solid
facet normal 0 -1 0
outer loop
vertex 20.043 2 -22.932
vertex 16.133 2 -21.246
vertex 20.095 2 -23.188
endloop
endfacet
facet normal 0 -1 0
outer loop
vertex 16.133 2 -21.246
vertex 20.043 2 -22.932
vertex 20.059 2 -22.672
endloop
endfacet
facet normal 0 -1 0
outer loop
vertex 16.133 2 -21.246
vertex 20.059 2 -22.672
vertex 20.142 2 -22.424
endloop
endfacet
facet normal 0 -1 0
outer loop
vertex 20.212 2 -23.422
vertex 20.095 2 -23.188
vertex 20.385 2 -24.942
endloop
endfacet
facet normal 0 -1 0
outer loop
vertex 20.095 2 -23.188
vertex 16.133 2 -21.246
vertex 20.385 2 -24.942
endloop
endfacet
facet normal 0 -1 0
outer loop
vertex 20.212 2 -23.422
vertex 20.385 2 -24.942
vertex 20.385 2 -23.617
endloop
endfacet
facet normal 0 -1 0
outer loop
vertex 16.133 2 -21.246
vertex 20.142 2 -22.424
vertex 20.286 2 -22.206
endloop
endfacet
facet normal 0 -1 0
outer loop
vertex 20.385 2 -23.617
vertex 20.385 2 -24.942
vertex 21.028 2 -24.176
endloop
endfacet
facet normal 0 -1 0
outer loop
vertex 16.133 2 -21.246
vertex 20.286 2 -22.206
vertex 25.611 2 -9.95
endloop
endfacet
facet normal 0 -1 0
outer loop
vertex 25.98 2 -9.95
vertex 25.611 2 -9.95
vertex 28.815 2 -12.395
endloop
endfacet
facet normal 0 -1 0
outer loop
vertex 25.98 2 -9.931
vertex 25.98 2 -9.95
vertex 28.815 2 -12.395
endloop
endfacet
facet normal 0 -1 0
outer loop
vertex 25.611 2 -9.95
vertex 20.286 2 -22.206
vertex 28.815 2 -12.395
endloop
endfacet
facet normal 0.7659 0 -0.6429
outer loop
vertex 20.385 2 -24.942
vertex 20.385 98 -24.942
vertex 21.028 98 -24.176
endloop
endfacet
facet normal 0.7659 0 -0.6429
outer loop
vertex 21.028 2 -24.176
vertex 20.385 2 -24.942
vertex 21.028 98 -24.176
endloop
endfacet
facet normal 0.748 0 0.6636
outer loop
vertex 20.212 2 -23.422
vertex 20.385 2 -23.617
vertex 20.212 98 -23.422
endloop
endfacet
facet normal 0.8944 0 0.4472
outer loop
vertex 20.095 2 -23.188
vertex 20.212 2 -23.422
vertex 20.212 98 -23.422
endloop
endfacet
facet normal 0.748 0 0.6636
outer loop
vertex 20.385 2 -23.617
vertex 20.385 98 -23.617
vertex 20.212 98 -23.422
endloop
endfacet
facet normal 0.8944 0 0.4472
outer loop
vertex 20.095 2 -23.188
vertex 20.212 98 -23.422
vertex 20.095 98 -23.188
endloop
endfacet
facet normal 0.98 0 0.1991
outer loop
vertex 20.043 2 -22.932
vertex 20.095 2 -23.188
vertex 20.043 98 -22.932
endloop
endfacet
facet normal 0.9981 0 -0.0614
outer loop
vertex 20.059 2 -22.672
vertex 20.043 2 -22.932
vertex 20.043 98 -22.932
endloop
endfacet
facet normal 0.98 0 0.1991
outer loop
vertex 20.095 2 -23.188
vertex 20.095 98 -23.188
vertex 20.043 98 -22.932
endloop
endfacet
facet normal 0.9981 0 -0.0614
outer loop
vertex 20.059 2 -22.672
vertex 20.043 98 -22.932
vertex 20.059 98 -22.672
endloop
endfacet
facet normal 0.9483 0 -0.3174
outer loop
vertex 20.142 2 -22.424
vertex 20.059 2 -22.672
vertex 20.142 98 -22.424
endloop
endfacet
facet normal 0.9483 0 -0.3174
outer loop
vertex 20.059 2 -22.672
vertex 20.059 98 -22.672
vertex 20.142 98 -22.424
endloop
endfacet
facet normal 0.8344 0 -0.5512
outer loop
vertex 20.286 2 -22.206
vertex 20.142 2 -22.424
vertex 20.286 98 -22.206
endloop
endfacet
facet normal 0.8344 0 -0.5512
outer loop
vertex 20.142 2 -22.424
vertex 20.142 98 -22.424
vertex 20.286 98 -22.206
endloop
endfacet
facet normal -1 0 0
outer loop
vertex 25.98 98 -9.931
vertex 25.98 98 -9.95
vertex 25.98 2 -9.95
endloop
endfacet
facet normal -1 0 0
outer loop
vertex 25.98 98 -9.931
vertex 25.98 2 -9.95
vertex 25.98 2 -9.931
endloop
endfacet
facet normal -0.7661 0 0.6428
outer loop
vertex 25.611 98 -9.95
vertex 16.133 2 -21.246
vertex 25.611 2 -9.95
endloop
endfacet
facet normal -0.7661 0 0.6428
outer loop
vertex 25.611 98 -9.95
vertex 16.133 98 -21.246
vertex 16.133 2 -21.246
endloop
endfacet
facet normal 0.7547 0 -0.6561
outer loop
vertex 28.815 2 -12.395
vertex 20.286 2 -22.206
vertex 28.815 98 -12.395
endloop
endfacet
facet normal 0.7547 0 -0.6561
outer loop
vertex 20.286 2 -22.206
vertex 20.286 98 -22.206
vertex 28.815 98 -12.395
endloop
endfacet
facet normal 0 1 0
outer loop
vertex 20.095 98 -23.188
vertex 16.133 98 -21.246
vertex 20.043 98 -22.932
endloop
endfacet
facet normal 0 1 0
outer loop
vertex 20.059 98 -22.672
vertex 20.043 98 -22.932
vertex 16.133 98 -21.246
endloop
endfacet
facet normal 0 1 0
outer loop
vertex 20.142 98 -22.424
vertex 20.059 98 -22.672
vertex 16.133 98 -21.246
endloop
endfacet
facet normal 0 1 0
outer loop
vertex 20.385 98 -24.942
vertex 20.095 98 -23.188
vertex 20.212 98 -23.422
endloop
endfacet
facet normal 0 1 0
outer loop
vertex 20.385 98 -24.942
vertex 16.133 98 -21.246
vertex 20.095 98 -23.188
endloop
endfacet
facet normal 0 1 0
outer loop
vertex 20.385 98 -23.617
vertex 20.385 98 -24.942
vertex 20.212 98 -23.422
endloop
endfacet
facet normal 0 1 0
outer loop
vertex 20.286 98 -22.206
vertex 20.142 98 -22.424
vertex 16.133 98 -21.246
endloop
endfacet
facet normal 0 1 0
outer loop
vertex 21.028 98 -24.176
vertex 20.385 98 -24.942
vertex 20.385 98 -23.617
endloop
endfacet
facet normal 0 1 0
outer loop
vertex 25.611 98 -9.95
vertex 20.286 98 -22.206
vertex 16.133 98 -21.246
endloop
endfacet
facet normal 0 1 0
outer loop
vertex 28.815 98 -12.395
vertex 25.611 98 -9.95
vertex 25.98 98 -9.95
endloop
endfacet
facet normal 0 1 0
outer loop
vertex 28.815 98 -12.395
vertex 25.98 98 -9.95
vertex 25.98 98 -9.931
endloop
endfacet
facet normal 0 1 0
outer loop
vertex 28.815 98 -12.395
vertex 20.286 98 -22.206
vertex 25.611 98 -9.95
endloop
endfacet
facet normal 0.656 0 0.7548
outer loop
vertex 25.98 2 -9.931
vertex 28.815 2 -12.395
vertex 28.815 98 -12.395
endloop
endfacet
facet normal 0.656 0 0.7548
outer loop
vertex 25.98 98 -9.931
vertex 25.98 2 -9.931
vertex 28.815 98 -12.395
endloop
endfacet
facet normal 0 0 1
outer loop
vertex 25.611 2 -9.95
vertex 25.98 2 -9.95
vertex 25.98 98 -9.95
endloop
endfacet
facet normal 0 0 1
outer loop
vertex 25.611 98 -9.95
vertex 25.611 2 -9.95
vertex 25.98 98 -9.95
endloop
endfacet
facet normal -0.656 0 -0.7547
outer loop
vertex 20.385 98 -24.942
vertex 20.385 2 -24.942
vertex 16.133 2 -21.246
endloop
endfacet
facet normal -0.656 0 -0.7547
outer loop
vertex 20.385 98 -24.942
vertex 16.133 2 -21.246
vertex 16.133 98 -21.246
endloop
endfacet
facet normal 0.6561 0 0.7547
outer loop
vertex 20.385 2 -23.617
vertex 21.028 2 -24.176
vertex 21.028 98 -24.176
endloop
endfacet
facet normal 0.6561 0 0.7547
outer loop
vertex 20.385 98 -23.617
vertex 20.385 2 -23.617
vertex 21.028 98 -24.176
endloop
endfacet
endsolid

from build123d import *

# Parameters (mm, degrees)
BOX021_W               = 10
BOX021_H               = 100
BOX021_DEPTH           = 10
BOX021_PLACEMENT_ANGLE = 310
BOX022_W               = 16
BOX022_H               = 102
BOX022_DEPTH           = 3
BOX022_PLACEMENT_ANGLE = 310
BOX023_W               = 3
BOX023_H               = 102
BOX023_DEPTH           = 2
BOX009_W               = 14
BOX009_H               = 96
BOX009_DEPTH           = 5
BOX008_W               = 15
BOX008_H               = 96
BOX008_DEPTH           = 10
FILLET_R               = 1
FILLET_PLACEMENT_ANGLE = 311


with BuildPart() as cube021:
    # Box021 → Box021 (new body)
    with BuildSketch(Plane.XY):
        with Locations((5, 50)):
            Rectangle(BOX021_W, BOX021_H)
    extrude(amount=BOX021_DEPTH)


with BuildPart() as cube021_1:
    # Box021 placement: moved
    add(cube021.part.moved(Location((25, 1, -35))).rotate(Axis((25, 1, -35), (0, 1, 0)), BOX021_PLACEMENT_ANGLE))


with BuildPart() as cube022:
    # Box022 → Box022 (new body)
    with BuildSketch(Plane.XY):
        with Locations((8, 51)):
            Rectangle(BOX022_W, BOX022_H)
    extrude(amount=BOX022_DEPTH)


with BuildPart() as cube022_1:
    # Box022 placement: moved
    add(cube022.part.moved(Location((15.5, 0, -22))).rotate(Axis((15.5, 0, -22), (0, 1, 0)), BOX022_PLACEMENT_ANGLE))


with BuildPart() as fusion001:
    # Box023 → Box023 (new body)
    with BuildSketch(Plane(origin=(25.98, 0, -9.95), x_dir=(0, 0, 1), z_dir=(-1, 0, 0))):
        with Locations((1.5, 51)):
            Rectangle(BOX023_W, BOX023_H)
    extrude(amount=BOX023_DEPTH)

    # Fusion001: union Cube022
    add(cube022_1.part)


with BuildPart() as cube009:
    # Box009 → Box009 (new body)
    with BuildSketch(Plane(origin=(14, 2, -21), x_dir=(1, 0, 0), z_dir=(0, 0, 1))):
        with Locations((7, 48)):
            Rectangle(BOX009_W, BOX009_H)
    extrude(amount=BOX009_DEPTH)


with BuildPart() as cut013:
    # Box008 → Box008 (new body)
    with BuildSketch(Plane(origin=(13, 2, -21), x_dir=(1, 0, 0), z_dir=(0, 0, 1))):
        with Locations((7.5, 48)):
            Rectangle(BOX008_W, BOX008_H)
    extrude(amount=BOX008_DEPTH)

    # Cut002: cut Cube009
    add(cube009.part, mode=Mode.SUBTRACT)

    # Fillet
    fillet_edges = [cut013.edges().sort_by_distance(p)[0] for p in [
        (14, 50, -16),
    ]]
    fillet(fillet_edges, radius=FILLET_R)


with BuildPart() as cut013_1:
    # Fillet placement: moved
    add(cut013.part.moved(Location((-1.63, 0, -23.03))).rotate(Axis((-1.63, 0, -23.03), (0, 1, 0)), FILLET_PLACEMENT_ANGLE))

    # Cut012: cut Fusion001
    add(fusion001.part, mode=Mode.SUBTRACT)

    # Cut013: cut Cube021
    add(cube021_1.part, mode=Mode.SUBTRACT)


solid = cut013_1.part
